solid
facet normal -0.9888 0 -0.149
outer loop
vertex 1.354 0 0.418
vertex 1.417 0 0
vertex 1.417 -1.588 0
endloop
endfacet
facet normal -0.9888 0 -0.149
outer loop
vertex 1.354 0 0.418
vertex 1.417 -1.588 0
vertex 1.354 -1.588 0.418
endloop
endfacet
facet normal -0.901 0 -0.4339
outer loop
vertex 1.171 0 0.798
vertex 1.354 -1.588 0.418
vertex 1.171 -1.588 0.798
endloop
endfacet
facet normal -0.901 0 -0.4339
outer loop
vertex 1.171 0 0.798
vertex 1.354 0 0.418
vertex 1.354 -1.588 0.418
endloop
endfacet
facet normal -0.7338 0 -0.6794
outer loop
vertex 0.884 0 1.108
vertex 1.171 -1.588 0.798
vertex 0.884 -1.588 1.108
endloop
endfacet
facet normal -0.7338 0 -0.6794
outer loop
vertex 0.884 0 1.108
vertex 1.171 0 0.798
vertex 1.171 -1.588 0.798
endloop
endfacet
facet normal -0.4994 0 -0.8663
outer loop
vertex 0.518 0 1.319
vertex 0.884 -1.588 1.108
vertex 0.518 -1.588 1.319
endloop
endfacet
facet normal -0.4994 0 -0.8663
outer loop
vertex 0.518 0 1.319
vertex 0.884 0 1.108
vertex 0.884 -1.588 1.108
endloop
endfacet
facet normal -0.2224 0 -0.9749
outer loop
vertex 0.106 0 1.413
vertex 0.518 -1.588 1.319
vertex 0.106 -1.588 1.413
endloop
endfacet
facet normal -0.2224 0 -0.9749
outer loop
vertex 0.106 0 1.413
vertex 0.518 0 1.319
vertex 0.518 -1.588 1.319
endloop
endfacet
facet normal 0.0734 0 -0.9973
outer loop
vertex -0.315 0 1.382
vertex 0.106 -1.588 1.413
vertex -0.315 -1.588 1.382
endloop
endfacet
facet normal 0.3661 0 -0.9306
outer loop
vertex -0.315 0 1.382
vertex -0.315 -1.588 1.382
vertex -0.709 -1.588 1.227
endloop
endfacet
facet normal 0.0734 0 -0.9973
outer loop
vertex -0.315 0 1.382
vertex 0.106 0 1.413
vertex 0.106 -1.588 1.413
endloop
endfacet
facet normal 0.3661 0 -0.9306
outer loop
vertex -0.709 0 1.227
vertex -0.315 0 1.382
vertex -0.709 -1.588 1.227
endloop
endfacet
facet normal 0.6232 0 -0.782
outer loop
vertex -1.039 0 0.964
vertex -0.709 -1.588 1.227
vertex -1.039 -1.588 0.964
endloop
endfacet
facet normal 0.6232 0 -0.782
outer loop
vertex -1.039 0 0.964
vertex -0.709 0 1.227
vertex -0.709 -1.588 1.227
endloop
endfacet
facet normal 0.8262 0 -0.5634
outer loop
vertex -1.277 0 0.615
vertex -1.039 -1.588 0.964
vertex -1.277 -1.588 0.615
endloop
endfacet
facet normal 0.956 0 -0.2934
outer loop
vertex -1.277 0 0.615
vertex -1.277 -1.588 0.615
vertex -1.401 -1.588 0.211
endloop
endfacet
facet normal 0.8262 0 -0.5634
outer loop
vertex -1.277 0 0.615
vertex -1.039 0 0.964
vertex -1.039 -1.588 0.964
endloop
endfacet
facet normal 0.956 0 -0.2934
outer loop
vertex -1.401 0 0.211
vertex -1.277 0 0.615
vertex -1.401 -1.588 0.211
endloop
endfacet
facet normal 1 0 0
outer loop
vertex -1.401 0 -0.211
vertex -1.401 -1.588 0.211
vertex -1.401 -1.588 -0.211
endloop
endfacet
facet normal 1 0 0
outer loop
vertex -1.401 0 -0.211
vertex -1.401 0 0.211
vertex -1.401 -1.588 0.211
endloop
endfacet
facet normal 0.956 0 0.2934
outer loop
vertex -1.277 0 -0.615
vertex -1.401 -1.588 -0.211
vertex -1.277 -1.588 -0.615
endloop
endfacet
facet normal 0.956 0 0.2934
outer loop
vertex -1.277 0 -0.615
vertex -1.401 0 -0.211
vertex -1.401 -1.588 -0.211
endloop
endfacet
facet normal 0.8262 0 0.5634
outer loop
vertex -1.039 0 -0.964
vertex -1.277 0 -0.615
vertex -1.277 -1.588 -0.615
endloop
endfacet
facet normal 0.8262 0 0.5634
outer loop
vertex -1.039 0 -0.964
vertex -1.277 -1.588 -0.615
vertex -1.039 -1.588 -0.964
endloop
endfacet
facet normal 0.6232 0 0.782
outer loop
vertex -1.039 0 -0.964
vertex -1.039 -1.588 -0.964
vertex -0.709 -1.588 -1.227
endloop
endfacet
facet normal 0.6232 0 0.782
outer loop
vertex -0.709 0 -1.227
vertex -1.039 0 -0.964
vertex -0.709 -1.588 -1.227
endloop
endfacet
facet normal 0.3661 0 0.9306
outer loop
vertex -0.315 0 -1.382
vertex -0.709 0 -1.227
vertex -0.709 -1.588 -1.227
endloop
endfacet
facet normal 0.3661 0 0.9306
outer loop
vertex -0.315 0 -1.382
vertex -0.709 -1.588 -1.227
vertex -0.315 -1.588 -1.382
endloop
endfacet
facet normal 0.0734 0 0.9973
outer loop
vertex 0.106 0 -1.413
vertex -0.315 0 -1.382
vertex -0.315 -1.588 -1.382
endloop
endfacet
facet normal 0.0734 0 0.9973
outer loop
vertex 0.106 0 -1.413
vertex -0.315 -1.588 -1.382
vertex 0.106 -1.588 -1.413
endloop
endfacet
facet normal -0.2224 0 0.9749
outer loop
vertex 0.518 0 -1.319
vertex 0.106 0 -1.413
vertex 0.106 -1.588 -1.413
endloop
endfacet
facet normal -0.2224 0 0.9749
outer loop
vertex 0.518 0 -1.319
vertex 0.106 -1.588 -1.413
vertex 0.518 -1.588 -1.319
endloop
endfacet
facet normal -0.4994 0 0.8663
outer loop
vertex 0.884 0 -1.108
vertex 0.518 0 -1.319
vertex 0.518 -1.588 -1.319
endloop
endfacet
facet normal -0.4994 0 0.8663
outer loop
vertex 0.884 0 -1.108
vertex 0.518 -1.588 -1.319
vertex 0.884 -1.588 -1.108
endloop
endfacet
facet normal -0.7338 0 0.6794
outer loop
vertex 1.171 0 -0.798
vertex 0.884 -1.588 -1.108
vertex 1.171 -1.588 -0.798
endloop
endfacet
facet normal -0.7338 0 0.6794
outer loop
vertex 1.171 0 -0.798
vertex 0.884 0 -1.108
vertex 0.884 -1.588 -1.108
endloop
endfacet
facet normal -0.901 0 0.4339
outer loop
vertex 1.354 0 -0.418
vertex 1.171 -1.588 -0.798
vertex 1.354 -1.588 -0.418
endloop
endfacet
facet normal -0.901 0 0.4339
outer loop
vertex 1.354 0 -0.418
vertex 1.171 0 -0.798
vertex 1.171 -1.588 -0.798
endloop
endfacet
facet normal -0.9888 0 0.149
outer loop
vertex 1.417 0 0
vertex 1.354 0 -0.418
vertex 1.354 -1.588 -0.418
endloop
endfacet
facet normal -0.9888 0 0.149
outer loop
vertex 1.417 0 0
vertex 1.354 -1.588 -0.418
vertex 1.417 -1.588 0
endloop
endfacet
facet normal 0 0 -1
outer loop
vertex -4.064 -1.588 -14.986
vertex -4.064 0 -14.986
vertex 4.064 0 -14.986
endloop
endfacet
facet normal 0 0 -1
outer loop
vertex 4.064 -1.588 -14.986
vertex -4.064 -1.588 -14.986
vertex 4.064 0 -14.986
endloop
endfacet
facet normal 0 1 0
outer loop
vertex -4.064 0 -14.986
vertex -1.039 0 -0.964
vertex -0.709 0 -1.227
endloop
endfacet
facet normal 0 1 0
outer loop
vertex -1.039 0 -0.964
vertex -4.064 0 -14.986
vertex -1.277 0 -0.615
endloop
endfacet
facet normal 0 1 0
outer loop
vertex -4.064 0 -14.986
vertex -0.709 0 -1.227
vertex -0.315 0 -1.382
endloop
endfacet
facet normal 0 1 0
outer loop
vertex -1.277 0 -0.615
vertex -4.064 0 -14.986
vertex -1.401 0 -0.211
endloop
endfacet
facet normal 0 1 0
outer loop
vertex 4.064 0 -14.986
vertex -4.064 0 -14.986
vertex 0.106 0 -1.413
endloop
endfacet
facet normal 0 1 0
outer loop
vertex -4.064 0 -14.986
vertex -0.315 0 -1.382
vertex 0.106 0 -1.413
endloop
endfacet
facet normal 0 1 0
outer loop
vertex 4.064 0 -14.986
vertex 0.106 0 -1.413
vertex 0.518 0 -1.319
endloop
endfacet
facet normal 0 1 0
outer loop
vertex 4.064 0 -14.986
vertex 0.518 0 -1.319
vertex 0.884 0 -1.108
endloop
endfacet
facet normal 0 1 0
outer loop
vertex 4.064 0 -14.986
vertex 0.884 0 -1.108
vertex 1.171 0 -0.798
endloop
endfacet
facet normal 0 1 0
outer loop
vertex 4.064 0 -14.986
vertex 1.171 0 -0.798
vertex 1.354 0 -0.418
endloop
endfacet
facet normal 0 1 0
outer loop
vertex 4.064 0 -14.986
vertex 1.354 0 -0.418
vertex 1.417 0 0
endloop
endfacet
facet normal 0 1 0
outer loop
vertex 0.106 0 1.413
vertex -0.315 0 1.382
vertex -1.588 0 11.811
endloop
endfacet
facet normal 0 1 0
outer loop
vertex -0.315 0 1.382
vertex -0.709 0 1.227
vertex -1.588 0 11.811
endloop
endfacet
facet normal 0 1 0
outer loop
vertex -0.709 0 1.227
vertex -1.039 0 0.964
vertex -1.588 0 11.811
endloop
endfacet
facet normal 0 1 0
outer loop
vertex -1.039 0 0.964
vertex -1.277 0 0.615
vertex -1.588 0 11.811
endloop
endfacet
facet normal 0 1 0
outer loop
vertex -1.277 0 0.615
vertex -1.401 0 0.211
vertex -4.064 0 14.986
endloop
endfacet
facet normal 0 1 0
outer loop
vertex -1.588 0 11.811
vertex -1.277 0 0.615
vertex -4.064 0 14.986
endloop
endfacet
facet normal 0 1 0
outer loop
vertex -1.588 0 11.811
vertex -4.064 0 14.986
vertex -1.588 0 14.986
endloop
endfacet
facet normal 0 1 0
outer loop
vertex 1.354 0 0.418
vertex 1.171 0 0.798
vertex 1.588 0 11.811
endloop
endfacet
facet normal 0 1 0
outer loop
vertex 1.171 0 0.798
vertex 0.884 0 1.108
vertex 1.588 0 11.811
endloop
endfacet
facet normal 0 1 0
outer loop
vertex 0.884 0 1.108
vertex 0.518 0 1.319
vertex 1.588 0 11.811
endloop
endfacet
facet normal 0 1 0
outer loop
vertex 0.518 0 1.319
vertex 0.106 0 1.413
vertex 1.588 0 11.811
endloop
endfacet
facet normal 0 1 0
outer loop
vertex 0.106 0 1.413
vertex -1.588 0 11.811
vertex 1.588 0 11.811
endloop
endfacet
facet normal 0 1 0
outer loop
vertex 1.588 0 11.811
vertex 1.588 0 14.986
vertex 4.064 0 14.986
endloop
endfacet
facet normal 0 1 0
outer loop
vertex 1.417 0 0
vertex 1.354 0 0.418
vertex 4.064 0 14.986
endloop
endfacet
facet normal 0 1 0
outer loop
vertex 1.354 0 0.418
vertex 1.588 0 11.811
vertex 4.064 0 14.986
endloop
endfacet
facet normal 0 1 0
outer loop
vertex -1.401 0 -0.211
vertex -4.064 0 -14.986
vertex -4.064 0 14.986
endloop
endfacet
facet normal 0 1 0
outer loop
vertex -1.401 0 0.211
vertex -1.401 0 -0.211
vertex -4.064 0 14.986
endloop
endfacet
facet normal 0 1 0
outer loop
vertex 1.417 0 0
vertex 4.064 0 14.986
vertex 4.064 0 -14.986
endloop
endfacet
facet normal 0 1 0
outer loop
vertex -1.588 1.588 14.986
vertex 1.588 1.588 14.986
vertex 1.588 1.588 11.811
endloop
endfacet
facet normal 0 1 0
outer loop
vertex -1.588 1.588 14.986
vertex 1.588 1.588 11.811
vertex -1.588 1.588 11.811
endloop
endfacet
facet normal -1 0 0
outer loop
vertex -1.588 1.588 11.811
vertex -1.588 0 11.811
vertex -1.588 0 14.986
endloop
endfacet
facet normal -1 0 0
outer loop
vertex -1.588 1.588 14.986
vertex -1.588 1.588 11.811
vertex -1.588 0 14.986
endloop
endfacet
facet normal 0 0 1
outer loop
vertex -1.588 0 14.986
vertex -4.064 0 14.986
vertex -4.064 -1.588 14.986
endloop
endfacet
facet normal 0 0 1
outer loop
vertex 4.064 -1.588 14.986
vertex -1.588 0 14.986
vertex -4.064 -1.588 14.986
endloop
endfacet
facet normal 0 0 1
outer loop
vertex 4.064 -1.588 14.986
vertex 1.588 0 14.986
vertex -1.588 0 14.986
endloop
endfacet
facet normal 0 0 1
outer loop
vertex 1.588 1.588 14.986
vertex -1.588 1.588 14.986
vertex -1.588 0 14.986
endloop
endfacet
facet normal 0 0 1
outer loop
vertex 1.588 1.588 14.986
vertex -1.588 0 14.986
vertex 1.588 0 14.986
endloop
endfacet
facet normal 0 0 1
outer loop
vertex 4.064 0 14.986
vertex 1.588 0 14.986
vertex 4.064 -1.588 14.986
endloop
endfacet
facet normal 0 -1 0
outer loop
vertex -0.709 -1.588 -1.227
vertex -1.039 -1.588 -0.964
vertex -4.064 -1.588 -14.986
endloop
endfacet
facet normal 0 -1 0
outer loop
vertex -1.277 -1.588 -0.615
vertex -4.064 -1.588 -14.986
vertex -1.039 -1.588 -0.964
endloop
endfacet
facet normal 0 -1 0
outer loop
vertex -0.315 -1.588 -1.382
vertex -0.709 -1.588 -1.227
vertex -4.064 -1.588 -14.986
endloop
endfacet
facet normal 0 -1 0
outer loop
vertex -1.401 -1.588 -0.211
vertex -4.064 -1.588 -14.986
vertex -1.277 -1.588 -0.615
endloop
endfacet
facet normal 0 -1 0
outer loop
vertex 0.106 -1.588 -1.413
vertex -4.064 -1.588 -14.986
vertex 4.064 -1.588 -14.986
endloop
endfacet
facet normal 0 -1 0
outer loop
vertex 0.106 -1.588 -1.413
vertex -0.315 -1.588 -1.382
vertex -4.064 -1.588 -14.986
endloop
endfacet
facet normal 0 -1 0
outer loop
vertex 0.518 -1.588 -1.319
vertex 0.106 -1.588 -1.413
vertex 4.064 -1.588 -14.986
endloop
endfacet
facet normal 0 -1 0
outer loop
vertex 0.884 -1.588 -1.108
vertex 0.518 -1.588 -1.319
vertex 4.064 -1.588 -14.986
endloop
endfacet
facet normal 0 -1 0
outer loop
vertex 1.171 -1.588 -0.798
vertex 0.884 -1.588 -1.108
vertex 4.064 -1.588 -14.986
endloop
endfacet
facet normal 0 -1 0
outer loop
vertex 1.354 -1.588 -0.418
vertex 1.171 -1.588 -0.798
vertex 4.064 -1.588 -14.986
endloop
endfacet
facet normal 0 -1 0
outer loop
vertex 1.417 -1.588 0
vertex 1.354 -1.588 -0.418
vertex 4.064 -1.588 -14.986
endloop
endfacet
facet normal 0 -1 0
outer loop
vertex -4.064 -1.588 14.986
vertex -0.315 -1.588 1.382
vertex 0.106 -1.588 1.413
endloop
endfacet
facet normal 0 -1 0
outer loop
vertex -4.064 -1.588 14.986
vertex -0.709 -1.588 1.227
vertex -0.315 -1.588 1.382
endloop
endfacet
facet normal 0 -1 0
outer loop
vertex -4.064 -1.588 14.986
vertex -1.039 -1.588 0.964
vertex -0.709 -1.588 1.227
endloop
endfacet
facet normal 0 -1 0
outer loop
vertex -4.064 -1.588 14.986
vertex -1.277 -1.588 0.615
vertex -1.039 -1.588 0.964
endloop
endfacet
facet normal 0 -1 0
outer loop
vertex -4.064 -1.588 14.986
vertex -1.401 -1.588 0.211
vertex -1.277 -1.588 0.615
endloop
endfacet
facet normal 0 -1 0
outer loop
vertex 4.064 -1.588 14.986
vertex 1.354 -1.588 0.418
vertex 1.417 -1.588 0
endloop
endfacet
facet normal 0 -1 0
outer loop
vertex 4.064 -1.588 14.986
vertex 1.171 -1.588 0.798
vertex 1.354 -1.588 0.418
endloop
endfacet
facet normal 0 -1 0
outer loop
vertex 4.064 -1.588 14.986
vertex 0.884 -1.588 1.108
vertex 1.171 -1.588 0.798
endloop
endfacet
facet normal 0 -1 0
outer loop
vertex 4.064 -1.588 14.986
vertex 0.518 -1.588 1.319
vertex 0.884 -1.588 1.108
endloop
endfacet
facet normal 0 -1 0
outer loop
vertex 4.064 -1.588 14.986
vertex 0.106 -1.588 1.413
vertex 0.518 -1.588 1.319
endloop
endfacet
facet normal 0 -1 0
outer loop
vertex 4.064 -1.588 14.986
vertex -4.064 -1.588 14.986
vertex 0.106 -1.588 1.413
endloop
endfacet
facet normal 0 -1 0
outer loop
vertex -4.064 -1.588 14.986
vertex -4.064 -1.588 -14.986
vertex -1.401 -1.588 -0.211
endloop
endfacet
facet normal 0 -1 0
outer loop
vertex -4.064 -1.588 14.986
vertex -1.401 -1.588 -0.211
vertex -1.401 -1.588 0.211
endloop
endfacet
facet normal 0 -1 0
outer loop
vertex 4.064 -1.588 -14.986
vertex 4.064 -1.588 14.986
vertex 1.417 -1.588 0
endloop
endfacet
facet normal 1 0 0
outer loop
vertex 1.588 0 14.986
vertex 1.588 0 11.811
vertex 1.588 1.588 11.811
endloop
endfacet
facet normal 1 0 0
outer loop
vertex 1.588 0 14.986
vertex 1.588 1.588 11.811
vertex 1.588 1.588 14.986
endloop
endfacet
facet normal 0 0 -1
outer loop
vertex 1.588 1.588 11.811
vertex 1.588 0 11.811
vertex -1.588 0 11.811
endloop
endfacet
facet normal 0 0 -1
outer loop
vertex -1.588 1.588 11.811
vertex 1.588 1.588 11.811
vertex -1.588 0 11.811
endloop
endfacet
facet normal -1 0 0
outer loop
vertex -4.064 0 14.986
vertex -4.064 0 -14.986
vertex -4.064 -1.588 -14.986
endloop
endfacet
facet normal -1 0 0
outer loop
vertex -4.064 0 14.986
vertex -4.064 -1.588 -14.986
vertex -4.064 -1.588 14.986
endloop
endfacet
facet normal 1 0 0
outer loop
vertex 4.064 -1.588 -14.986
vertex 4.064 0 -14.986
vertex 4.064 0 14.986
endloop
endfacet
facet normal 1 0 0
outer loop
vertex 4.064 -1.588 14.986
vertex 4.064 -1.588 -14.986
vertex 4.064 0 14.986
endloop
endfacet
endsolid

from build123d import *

# Parameters (mm, degrees)
F0_W     = 8.128
F0_H     = 29.972
F0_R     = 1.41732
F1_DEPTH = 1.5875
F2_W     = 3.175
F2_H     = 3.175
F3_DEPTH = 1.5875


with BuildPart() as f1:
    # F0 (on Front) → F1 (new body)
    with BuildSketch(Plane.XZ):
        Rectangle(F0_W, F0_H)
        Circle(F0_R, mode=Mode.SUBTRACT)
    extrude(amount=F1_DEPTH)

    # F2 (on face) → F3 (join)
    with BuildSketch(Plane(origin=(0, 0, 0), x_dir=(-1, 0, 0), z_dir=(0, 1, 0))):
        with Locations((0, 13.3985)):
            Rectangle(F2_W, F2_H)
    extrude(amount=F3_DEPTH)


solid = f1.part
